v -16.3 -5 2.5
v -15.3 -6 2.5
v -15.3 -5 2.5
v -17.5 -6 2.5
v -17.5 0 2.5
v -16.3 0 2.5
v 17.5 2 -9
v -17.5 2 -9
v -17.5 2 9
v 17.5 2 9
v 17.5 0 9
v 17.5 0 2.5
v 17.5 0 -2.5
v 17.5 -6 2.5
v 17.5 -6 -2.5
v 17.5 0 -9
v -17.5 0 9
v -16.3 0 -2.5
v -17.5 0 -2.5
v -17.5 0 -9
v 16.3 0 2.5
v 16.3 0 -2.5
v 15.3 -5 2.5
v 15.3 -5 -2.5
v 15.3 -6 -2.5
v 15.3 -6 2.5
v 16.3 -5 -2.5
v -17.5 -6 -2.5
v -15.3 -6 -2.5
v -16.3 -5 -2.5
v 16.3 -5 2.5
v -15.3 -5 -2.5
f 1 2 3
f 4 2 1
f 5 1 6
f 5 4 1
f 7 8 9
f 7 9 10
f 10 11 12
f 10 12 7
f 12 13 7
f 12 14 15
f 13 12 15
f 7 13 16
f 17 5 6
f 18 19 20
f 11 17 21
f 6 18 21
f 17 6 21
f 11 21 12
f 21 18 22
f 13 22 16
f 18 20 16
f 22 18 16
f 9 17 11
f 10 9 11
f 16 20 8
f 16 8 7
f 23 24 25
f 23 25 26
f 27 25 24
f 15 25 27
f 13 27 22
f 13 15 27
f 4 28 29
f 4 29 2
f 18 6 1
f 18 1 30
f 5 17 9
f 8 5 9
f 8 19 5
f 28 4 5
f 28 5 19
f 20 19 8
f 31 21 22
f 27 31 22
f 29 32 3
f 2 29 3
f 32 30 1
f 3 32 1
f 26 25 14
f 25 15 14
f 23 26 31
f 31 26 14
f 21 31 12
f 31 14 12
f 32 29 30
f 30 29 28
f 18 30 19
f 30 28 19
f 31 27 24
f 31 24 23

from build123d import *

# Parameters (mm, degrees)
SKETCH1_W           = 35
SKETCH1_H           = 18
BOSS_EXTRUDE1_DEPTH = 2
SKETCH2_W           = 5
SKETCH2_H           = 6
BOSS_EXTRUDE2_DEPTH = 1.2
SKETCH3_W           = 5
SKETCH3_H           = 1
BOSS_EXTRUDE3_DEPTH = 1


with BuildPart() as part:
    # Sketch1 → Boss-Extrude1 (new body)
    with BuildSketch(Plane(origin=(0, 0, 0), x_dir=(1, 0, 0), z_dir=(0, 1, 0))):
        Rectangle(SKETCH1_W, SKETCH1_H)
    extrude(amount=BOSS_EXTRUDE1_DEPTH)

    # Sketch2 → Boss-Extrude2 (add)
    with BuildSketch(Plane(origin=(17.5, 0, 0), x_dir=(0, 0, -1), z_dir=(1, 0, 0))):
        with Locations((0, -3)):
            Rectangle(SKETCH2_W, SKETCH2_H)
    boss_extrude2 = extrude(amount=-BOSS_EXTRUDE2_DEPTH)

    # Sketch3 → Boss-Extrude3 (add)
    with BuildSketch(Plane.ZY.offset(-16.3)):
        with Locations((0, -5.5)):
            Rectangle(SKETCH3_W, SKETCH3_H)
    boss_extrude3 = extrude(amount=BOSS_EXTRUDE3_DEPTH)

    # Mirror1: Boss-Extrude2, Boss-Extrude3 across plane
    add(boss_extrude2.mirror(Plane(origin=(0, 0, 0), x_dir=(0, 0, 1), z_dir=(1, 0, 0))))
    add(boss_extrude3.mirror(Plane(origin=(0, 0, 0), x_dir=(0, 0, 1), z_dir=(1, 0, 0))))


solid = part.part
